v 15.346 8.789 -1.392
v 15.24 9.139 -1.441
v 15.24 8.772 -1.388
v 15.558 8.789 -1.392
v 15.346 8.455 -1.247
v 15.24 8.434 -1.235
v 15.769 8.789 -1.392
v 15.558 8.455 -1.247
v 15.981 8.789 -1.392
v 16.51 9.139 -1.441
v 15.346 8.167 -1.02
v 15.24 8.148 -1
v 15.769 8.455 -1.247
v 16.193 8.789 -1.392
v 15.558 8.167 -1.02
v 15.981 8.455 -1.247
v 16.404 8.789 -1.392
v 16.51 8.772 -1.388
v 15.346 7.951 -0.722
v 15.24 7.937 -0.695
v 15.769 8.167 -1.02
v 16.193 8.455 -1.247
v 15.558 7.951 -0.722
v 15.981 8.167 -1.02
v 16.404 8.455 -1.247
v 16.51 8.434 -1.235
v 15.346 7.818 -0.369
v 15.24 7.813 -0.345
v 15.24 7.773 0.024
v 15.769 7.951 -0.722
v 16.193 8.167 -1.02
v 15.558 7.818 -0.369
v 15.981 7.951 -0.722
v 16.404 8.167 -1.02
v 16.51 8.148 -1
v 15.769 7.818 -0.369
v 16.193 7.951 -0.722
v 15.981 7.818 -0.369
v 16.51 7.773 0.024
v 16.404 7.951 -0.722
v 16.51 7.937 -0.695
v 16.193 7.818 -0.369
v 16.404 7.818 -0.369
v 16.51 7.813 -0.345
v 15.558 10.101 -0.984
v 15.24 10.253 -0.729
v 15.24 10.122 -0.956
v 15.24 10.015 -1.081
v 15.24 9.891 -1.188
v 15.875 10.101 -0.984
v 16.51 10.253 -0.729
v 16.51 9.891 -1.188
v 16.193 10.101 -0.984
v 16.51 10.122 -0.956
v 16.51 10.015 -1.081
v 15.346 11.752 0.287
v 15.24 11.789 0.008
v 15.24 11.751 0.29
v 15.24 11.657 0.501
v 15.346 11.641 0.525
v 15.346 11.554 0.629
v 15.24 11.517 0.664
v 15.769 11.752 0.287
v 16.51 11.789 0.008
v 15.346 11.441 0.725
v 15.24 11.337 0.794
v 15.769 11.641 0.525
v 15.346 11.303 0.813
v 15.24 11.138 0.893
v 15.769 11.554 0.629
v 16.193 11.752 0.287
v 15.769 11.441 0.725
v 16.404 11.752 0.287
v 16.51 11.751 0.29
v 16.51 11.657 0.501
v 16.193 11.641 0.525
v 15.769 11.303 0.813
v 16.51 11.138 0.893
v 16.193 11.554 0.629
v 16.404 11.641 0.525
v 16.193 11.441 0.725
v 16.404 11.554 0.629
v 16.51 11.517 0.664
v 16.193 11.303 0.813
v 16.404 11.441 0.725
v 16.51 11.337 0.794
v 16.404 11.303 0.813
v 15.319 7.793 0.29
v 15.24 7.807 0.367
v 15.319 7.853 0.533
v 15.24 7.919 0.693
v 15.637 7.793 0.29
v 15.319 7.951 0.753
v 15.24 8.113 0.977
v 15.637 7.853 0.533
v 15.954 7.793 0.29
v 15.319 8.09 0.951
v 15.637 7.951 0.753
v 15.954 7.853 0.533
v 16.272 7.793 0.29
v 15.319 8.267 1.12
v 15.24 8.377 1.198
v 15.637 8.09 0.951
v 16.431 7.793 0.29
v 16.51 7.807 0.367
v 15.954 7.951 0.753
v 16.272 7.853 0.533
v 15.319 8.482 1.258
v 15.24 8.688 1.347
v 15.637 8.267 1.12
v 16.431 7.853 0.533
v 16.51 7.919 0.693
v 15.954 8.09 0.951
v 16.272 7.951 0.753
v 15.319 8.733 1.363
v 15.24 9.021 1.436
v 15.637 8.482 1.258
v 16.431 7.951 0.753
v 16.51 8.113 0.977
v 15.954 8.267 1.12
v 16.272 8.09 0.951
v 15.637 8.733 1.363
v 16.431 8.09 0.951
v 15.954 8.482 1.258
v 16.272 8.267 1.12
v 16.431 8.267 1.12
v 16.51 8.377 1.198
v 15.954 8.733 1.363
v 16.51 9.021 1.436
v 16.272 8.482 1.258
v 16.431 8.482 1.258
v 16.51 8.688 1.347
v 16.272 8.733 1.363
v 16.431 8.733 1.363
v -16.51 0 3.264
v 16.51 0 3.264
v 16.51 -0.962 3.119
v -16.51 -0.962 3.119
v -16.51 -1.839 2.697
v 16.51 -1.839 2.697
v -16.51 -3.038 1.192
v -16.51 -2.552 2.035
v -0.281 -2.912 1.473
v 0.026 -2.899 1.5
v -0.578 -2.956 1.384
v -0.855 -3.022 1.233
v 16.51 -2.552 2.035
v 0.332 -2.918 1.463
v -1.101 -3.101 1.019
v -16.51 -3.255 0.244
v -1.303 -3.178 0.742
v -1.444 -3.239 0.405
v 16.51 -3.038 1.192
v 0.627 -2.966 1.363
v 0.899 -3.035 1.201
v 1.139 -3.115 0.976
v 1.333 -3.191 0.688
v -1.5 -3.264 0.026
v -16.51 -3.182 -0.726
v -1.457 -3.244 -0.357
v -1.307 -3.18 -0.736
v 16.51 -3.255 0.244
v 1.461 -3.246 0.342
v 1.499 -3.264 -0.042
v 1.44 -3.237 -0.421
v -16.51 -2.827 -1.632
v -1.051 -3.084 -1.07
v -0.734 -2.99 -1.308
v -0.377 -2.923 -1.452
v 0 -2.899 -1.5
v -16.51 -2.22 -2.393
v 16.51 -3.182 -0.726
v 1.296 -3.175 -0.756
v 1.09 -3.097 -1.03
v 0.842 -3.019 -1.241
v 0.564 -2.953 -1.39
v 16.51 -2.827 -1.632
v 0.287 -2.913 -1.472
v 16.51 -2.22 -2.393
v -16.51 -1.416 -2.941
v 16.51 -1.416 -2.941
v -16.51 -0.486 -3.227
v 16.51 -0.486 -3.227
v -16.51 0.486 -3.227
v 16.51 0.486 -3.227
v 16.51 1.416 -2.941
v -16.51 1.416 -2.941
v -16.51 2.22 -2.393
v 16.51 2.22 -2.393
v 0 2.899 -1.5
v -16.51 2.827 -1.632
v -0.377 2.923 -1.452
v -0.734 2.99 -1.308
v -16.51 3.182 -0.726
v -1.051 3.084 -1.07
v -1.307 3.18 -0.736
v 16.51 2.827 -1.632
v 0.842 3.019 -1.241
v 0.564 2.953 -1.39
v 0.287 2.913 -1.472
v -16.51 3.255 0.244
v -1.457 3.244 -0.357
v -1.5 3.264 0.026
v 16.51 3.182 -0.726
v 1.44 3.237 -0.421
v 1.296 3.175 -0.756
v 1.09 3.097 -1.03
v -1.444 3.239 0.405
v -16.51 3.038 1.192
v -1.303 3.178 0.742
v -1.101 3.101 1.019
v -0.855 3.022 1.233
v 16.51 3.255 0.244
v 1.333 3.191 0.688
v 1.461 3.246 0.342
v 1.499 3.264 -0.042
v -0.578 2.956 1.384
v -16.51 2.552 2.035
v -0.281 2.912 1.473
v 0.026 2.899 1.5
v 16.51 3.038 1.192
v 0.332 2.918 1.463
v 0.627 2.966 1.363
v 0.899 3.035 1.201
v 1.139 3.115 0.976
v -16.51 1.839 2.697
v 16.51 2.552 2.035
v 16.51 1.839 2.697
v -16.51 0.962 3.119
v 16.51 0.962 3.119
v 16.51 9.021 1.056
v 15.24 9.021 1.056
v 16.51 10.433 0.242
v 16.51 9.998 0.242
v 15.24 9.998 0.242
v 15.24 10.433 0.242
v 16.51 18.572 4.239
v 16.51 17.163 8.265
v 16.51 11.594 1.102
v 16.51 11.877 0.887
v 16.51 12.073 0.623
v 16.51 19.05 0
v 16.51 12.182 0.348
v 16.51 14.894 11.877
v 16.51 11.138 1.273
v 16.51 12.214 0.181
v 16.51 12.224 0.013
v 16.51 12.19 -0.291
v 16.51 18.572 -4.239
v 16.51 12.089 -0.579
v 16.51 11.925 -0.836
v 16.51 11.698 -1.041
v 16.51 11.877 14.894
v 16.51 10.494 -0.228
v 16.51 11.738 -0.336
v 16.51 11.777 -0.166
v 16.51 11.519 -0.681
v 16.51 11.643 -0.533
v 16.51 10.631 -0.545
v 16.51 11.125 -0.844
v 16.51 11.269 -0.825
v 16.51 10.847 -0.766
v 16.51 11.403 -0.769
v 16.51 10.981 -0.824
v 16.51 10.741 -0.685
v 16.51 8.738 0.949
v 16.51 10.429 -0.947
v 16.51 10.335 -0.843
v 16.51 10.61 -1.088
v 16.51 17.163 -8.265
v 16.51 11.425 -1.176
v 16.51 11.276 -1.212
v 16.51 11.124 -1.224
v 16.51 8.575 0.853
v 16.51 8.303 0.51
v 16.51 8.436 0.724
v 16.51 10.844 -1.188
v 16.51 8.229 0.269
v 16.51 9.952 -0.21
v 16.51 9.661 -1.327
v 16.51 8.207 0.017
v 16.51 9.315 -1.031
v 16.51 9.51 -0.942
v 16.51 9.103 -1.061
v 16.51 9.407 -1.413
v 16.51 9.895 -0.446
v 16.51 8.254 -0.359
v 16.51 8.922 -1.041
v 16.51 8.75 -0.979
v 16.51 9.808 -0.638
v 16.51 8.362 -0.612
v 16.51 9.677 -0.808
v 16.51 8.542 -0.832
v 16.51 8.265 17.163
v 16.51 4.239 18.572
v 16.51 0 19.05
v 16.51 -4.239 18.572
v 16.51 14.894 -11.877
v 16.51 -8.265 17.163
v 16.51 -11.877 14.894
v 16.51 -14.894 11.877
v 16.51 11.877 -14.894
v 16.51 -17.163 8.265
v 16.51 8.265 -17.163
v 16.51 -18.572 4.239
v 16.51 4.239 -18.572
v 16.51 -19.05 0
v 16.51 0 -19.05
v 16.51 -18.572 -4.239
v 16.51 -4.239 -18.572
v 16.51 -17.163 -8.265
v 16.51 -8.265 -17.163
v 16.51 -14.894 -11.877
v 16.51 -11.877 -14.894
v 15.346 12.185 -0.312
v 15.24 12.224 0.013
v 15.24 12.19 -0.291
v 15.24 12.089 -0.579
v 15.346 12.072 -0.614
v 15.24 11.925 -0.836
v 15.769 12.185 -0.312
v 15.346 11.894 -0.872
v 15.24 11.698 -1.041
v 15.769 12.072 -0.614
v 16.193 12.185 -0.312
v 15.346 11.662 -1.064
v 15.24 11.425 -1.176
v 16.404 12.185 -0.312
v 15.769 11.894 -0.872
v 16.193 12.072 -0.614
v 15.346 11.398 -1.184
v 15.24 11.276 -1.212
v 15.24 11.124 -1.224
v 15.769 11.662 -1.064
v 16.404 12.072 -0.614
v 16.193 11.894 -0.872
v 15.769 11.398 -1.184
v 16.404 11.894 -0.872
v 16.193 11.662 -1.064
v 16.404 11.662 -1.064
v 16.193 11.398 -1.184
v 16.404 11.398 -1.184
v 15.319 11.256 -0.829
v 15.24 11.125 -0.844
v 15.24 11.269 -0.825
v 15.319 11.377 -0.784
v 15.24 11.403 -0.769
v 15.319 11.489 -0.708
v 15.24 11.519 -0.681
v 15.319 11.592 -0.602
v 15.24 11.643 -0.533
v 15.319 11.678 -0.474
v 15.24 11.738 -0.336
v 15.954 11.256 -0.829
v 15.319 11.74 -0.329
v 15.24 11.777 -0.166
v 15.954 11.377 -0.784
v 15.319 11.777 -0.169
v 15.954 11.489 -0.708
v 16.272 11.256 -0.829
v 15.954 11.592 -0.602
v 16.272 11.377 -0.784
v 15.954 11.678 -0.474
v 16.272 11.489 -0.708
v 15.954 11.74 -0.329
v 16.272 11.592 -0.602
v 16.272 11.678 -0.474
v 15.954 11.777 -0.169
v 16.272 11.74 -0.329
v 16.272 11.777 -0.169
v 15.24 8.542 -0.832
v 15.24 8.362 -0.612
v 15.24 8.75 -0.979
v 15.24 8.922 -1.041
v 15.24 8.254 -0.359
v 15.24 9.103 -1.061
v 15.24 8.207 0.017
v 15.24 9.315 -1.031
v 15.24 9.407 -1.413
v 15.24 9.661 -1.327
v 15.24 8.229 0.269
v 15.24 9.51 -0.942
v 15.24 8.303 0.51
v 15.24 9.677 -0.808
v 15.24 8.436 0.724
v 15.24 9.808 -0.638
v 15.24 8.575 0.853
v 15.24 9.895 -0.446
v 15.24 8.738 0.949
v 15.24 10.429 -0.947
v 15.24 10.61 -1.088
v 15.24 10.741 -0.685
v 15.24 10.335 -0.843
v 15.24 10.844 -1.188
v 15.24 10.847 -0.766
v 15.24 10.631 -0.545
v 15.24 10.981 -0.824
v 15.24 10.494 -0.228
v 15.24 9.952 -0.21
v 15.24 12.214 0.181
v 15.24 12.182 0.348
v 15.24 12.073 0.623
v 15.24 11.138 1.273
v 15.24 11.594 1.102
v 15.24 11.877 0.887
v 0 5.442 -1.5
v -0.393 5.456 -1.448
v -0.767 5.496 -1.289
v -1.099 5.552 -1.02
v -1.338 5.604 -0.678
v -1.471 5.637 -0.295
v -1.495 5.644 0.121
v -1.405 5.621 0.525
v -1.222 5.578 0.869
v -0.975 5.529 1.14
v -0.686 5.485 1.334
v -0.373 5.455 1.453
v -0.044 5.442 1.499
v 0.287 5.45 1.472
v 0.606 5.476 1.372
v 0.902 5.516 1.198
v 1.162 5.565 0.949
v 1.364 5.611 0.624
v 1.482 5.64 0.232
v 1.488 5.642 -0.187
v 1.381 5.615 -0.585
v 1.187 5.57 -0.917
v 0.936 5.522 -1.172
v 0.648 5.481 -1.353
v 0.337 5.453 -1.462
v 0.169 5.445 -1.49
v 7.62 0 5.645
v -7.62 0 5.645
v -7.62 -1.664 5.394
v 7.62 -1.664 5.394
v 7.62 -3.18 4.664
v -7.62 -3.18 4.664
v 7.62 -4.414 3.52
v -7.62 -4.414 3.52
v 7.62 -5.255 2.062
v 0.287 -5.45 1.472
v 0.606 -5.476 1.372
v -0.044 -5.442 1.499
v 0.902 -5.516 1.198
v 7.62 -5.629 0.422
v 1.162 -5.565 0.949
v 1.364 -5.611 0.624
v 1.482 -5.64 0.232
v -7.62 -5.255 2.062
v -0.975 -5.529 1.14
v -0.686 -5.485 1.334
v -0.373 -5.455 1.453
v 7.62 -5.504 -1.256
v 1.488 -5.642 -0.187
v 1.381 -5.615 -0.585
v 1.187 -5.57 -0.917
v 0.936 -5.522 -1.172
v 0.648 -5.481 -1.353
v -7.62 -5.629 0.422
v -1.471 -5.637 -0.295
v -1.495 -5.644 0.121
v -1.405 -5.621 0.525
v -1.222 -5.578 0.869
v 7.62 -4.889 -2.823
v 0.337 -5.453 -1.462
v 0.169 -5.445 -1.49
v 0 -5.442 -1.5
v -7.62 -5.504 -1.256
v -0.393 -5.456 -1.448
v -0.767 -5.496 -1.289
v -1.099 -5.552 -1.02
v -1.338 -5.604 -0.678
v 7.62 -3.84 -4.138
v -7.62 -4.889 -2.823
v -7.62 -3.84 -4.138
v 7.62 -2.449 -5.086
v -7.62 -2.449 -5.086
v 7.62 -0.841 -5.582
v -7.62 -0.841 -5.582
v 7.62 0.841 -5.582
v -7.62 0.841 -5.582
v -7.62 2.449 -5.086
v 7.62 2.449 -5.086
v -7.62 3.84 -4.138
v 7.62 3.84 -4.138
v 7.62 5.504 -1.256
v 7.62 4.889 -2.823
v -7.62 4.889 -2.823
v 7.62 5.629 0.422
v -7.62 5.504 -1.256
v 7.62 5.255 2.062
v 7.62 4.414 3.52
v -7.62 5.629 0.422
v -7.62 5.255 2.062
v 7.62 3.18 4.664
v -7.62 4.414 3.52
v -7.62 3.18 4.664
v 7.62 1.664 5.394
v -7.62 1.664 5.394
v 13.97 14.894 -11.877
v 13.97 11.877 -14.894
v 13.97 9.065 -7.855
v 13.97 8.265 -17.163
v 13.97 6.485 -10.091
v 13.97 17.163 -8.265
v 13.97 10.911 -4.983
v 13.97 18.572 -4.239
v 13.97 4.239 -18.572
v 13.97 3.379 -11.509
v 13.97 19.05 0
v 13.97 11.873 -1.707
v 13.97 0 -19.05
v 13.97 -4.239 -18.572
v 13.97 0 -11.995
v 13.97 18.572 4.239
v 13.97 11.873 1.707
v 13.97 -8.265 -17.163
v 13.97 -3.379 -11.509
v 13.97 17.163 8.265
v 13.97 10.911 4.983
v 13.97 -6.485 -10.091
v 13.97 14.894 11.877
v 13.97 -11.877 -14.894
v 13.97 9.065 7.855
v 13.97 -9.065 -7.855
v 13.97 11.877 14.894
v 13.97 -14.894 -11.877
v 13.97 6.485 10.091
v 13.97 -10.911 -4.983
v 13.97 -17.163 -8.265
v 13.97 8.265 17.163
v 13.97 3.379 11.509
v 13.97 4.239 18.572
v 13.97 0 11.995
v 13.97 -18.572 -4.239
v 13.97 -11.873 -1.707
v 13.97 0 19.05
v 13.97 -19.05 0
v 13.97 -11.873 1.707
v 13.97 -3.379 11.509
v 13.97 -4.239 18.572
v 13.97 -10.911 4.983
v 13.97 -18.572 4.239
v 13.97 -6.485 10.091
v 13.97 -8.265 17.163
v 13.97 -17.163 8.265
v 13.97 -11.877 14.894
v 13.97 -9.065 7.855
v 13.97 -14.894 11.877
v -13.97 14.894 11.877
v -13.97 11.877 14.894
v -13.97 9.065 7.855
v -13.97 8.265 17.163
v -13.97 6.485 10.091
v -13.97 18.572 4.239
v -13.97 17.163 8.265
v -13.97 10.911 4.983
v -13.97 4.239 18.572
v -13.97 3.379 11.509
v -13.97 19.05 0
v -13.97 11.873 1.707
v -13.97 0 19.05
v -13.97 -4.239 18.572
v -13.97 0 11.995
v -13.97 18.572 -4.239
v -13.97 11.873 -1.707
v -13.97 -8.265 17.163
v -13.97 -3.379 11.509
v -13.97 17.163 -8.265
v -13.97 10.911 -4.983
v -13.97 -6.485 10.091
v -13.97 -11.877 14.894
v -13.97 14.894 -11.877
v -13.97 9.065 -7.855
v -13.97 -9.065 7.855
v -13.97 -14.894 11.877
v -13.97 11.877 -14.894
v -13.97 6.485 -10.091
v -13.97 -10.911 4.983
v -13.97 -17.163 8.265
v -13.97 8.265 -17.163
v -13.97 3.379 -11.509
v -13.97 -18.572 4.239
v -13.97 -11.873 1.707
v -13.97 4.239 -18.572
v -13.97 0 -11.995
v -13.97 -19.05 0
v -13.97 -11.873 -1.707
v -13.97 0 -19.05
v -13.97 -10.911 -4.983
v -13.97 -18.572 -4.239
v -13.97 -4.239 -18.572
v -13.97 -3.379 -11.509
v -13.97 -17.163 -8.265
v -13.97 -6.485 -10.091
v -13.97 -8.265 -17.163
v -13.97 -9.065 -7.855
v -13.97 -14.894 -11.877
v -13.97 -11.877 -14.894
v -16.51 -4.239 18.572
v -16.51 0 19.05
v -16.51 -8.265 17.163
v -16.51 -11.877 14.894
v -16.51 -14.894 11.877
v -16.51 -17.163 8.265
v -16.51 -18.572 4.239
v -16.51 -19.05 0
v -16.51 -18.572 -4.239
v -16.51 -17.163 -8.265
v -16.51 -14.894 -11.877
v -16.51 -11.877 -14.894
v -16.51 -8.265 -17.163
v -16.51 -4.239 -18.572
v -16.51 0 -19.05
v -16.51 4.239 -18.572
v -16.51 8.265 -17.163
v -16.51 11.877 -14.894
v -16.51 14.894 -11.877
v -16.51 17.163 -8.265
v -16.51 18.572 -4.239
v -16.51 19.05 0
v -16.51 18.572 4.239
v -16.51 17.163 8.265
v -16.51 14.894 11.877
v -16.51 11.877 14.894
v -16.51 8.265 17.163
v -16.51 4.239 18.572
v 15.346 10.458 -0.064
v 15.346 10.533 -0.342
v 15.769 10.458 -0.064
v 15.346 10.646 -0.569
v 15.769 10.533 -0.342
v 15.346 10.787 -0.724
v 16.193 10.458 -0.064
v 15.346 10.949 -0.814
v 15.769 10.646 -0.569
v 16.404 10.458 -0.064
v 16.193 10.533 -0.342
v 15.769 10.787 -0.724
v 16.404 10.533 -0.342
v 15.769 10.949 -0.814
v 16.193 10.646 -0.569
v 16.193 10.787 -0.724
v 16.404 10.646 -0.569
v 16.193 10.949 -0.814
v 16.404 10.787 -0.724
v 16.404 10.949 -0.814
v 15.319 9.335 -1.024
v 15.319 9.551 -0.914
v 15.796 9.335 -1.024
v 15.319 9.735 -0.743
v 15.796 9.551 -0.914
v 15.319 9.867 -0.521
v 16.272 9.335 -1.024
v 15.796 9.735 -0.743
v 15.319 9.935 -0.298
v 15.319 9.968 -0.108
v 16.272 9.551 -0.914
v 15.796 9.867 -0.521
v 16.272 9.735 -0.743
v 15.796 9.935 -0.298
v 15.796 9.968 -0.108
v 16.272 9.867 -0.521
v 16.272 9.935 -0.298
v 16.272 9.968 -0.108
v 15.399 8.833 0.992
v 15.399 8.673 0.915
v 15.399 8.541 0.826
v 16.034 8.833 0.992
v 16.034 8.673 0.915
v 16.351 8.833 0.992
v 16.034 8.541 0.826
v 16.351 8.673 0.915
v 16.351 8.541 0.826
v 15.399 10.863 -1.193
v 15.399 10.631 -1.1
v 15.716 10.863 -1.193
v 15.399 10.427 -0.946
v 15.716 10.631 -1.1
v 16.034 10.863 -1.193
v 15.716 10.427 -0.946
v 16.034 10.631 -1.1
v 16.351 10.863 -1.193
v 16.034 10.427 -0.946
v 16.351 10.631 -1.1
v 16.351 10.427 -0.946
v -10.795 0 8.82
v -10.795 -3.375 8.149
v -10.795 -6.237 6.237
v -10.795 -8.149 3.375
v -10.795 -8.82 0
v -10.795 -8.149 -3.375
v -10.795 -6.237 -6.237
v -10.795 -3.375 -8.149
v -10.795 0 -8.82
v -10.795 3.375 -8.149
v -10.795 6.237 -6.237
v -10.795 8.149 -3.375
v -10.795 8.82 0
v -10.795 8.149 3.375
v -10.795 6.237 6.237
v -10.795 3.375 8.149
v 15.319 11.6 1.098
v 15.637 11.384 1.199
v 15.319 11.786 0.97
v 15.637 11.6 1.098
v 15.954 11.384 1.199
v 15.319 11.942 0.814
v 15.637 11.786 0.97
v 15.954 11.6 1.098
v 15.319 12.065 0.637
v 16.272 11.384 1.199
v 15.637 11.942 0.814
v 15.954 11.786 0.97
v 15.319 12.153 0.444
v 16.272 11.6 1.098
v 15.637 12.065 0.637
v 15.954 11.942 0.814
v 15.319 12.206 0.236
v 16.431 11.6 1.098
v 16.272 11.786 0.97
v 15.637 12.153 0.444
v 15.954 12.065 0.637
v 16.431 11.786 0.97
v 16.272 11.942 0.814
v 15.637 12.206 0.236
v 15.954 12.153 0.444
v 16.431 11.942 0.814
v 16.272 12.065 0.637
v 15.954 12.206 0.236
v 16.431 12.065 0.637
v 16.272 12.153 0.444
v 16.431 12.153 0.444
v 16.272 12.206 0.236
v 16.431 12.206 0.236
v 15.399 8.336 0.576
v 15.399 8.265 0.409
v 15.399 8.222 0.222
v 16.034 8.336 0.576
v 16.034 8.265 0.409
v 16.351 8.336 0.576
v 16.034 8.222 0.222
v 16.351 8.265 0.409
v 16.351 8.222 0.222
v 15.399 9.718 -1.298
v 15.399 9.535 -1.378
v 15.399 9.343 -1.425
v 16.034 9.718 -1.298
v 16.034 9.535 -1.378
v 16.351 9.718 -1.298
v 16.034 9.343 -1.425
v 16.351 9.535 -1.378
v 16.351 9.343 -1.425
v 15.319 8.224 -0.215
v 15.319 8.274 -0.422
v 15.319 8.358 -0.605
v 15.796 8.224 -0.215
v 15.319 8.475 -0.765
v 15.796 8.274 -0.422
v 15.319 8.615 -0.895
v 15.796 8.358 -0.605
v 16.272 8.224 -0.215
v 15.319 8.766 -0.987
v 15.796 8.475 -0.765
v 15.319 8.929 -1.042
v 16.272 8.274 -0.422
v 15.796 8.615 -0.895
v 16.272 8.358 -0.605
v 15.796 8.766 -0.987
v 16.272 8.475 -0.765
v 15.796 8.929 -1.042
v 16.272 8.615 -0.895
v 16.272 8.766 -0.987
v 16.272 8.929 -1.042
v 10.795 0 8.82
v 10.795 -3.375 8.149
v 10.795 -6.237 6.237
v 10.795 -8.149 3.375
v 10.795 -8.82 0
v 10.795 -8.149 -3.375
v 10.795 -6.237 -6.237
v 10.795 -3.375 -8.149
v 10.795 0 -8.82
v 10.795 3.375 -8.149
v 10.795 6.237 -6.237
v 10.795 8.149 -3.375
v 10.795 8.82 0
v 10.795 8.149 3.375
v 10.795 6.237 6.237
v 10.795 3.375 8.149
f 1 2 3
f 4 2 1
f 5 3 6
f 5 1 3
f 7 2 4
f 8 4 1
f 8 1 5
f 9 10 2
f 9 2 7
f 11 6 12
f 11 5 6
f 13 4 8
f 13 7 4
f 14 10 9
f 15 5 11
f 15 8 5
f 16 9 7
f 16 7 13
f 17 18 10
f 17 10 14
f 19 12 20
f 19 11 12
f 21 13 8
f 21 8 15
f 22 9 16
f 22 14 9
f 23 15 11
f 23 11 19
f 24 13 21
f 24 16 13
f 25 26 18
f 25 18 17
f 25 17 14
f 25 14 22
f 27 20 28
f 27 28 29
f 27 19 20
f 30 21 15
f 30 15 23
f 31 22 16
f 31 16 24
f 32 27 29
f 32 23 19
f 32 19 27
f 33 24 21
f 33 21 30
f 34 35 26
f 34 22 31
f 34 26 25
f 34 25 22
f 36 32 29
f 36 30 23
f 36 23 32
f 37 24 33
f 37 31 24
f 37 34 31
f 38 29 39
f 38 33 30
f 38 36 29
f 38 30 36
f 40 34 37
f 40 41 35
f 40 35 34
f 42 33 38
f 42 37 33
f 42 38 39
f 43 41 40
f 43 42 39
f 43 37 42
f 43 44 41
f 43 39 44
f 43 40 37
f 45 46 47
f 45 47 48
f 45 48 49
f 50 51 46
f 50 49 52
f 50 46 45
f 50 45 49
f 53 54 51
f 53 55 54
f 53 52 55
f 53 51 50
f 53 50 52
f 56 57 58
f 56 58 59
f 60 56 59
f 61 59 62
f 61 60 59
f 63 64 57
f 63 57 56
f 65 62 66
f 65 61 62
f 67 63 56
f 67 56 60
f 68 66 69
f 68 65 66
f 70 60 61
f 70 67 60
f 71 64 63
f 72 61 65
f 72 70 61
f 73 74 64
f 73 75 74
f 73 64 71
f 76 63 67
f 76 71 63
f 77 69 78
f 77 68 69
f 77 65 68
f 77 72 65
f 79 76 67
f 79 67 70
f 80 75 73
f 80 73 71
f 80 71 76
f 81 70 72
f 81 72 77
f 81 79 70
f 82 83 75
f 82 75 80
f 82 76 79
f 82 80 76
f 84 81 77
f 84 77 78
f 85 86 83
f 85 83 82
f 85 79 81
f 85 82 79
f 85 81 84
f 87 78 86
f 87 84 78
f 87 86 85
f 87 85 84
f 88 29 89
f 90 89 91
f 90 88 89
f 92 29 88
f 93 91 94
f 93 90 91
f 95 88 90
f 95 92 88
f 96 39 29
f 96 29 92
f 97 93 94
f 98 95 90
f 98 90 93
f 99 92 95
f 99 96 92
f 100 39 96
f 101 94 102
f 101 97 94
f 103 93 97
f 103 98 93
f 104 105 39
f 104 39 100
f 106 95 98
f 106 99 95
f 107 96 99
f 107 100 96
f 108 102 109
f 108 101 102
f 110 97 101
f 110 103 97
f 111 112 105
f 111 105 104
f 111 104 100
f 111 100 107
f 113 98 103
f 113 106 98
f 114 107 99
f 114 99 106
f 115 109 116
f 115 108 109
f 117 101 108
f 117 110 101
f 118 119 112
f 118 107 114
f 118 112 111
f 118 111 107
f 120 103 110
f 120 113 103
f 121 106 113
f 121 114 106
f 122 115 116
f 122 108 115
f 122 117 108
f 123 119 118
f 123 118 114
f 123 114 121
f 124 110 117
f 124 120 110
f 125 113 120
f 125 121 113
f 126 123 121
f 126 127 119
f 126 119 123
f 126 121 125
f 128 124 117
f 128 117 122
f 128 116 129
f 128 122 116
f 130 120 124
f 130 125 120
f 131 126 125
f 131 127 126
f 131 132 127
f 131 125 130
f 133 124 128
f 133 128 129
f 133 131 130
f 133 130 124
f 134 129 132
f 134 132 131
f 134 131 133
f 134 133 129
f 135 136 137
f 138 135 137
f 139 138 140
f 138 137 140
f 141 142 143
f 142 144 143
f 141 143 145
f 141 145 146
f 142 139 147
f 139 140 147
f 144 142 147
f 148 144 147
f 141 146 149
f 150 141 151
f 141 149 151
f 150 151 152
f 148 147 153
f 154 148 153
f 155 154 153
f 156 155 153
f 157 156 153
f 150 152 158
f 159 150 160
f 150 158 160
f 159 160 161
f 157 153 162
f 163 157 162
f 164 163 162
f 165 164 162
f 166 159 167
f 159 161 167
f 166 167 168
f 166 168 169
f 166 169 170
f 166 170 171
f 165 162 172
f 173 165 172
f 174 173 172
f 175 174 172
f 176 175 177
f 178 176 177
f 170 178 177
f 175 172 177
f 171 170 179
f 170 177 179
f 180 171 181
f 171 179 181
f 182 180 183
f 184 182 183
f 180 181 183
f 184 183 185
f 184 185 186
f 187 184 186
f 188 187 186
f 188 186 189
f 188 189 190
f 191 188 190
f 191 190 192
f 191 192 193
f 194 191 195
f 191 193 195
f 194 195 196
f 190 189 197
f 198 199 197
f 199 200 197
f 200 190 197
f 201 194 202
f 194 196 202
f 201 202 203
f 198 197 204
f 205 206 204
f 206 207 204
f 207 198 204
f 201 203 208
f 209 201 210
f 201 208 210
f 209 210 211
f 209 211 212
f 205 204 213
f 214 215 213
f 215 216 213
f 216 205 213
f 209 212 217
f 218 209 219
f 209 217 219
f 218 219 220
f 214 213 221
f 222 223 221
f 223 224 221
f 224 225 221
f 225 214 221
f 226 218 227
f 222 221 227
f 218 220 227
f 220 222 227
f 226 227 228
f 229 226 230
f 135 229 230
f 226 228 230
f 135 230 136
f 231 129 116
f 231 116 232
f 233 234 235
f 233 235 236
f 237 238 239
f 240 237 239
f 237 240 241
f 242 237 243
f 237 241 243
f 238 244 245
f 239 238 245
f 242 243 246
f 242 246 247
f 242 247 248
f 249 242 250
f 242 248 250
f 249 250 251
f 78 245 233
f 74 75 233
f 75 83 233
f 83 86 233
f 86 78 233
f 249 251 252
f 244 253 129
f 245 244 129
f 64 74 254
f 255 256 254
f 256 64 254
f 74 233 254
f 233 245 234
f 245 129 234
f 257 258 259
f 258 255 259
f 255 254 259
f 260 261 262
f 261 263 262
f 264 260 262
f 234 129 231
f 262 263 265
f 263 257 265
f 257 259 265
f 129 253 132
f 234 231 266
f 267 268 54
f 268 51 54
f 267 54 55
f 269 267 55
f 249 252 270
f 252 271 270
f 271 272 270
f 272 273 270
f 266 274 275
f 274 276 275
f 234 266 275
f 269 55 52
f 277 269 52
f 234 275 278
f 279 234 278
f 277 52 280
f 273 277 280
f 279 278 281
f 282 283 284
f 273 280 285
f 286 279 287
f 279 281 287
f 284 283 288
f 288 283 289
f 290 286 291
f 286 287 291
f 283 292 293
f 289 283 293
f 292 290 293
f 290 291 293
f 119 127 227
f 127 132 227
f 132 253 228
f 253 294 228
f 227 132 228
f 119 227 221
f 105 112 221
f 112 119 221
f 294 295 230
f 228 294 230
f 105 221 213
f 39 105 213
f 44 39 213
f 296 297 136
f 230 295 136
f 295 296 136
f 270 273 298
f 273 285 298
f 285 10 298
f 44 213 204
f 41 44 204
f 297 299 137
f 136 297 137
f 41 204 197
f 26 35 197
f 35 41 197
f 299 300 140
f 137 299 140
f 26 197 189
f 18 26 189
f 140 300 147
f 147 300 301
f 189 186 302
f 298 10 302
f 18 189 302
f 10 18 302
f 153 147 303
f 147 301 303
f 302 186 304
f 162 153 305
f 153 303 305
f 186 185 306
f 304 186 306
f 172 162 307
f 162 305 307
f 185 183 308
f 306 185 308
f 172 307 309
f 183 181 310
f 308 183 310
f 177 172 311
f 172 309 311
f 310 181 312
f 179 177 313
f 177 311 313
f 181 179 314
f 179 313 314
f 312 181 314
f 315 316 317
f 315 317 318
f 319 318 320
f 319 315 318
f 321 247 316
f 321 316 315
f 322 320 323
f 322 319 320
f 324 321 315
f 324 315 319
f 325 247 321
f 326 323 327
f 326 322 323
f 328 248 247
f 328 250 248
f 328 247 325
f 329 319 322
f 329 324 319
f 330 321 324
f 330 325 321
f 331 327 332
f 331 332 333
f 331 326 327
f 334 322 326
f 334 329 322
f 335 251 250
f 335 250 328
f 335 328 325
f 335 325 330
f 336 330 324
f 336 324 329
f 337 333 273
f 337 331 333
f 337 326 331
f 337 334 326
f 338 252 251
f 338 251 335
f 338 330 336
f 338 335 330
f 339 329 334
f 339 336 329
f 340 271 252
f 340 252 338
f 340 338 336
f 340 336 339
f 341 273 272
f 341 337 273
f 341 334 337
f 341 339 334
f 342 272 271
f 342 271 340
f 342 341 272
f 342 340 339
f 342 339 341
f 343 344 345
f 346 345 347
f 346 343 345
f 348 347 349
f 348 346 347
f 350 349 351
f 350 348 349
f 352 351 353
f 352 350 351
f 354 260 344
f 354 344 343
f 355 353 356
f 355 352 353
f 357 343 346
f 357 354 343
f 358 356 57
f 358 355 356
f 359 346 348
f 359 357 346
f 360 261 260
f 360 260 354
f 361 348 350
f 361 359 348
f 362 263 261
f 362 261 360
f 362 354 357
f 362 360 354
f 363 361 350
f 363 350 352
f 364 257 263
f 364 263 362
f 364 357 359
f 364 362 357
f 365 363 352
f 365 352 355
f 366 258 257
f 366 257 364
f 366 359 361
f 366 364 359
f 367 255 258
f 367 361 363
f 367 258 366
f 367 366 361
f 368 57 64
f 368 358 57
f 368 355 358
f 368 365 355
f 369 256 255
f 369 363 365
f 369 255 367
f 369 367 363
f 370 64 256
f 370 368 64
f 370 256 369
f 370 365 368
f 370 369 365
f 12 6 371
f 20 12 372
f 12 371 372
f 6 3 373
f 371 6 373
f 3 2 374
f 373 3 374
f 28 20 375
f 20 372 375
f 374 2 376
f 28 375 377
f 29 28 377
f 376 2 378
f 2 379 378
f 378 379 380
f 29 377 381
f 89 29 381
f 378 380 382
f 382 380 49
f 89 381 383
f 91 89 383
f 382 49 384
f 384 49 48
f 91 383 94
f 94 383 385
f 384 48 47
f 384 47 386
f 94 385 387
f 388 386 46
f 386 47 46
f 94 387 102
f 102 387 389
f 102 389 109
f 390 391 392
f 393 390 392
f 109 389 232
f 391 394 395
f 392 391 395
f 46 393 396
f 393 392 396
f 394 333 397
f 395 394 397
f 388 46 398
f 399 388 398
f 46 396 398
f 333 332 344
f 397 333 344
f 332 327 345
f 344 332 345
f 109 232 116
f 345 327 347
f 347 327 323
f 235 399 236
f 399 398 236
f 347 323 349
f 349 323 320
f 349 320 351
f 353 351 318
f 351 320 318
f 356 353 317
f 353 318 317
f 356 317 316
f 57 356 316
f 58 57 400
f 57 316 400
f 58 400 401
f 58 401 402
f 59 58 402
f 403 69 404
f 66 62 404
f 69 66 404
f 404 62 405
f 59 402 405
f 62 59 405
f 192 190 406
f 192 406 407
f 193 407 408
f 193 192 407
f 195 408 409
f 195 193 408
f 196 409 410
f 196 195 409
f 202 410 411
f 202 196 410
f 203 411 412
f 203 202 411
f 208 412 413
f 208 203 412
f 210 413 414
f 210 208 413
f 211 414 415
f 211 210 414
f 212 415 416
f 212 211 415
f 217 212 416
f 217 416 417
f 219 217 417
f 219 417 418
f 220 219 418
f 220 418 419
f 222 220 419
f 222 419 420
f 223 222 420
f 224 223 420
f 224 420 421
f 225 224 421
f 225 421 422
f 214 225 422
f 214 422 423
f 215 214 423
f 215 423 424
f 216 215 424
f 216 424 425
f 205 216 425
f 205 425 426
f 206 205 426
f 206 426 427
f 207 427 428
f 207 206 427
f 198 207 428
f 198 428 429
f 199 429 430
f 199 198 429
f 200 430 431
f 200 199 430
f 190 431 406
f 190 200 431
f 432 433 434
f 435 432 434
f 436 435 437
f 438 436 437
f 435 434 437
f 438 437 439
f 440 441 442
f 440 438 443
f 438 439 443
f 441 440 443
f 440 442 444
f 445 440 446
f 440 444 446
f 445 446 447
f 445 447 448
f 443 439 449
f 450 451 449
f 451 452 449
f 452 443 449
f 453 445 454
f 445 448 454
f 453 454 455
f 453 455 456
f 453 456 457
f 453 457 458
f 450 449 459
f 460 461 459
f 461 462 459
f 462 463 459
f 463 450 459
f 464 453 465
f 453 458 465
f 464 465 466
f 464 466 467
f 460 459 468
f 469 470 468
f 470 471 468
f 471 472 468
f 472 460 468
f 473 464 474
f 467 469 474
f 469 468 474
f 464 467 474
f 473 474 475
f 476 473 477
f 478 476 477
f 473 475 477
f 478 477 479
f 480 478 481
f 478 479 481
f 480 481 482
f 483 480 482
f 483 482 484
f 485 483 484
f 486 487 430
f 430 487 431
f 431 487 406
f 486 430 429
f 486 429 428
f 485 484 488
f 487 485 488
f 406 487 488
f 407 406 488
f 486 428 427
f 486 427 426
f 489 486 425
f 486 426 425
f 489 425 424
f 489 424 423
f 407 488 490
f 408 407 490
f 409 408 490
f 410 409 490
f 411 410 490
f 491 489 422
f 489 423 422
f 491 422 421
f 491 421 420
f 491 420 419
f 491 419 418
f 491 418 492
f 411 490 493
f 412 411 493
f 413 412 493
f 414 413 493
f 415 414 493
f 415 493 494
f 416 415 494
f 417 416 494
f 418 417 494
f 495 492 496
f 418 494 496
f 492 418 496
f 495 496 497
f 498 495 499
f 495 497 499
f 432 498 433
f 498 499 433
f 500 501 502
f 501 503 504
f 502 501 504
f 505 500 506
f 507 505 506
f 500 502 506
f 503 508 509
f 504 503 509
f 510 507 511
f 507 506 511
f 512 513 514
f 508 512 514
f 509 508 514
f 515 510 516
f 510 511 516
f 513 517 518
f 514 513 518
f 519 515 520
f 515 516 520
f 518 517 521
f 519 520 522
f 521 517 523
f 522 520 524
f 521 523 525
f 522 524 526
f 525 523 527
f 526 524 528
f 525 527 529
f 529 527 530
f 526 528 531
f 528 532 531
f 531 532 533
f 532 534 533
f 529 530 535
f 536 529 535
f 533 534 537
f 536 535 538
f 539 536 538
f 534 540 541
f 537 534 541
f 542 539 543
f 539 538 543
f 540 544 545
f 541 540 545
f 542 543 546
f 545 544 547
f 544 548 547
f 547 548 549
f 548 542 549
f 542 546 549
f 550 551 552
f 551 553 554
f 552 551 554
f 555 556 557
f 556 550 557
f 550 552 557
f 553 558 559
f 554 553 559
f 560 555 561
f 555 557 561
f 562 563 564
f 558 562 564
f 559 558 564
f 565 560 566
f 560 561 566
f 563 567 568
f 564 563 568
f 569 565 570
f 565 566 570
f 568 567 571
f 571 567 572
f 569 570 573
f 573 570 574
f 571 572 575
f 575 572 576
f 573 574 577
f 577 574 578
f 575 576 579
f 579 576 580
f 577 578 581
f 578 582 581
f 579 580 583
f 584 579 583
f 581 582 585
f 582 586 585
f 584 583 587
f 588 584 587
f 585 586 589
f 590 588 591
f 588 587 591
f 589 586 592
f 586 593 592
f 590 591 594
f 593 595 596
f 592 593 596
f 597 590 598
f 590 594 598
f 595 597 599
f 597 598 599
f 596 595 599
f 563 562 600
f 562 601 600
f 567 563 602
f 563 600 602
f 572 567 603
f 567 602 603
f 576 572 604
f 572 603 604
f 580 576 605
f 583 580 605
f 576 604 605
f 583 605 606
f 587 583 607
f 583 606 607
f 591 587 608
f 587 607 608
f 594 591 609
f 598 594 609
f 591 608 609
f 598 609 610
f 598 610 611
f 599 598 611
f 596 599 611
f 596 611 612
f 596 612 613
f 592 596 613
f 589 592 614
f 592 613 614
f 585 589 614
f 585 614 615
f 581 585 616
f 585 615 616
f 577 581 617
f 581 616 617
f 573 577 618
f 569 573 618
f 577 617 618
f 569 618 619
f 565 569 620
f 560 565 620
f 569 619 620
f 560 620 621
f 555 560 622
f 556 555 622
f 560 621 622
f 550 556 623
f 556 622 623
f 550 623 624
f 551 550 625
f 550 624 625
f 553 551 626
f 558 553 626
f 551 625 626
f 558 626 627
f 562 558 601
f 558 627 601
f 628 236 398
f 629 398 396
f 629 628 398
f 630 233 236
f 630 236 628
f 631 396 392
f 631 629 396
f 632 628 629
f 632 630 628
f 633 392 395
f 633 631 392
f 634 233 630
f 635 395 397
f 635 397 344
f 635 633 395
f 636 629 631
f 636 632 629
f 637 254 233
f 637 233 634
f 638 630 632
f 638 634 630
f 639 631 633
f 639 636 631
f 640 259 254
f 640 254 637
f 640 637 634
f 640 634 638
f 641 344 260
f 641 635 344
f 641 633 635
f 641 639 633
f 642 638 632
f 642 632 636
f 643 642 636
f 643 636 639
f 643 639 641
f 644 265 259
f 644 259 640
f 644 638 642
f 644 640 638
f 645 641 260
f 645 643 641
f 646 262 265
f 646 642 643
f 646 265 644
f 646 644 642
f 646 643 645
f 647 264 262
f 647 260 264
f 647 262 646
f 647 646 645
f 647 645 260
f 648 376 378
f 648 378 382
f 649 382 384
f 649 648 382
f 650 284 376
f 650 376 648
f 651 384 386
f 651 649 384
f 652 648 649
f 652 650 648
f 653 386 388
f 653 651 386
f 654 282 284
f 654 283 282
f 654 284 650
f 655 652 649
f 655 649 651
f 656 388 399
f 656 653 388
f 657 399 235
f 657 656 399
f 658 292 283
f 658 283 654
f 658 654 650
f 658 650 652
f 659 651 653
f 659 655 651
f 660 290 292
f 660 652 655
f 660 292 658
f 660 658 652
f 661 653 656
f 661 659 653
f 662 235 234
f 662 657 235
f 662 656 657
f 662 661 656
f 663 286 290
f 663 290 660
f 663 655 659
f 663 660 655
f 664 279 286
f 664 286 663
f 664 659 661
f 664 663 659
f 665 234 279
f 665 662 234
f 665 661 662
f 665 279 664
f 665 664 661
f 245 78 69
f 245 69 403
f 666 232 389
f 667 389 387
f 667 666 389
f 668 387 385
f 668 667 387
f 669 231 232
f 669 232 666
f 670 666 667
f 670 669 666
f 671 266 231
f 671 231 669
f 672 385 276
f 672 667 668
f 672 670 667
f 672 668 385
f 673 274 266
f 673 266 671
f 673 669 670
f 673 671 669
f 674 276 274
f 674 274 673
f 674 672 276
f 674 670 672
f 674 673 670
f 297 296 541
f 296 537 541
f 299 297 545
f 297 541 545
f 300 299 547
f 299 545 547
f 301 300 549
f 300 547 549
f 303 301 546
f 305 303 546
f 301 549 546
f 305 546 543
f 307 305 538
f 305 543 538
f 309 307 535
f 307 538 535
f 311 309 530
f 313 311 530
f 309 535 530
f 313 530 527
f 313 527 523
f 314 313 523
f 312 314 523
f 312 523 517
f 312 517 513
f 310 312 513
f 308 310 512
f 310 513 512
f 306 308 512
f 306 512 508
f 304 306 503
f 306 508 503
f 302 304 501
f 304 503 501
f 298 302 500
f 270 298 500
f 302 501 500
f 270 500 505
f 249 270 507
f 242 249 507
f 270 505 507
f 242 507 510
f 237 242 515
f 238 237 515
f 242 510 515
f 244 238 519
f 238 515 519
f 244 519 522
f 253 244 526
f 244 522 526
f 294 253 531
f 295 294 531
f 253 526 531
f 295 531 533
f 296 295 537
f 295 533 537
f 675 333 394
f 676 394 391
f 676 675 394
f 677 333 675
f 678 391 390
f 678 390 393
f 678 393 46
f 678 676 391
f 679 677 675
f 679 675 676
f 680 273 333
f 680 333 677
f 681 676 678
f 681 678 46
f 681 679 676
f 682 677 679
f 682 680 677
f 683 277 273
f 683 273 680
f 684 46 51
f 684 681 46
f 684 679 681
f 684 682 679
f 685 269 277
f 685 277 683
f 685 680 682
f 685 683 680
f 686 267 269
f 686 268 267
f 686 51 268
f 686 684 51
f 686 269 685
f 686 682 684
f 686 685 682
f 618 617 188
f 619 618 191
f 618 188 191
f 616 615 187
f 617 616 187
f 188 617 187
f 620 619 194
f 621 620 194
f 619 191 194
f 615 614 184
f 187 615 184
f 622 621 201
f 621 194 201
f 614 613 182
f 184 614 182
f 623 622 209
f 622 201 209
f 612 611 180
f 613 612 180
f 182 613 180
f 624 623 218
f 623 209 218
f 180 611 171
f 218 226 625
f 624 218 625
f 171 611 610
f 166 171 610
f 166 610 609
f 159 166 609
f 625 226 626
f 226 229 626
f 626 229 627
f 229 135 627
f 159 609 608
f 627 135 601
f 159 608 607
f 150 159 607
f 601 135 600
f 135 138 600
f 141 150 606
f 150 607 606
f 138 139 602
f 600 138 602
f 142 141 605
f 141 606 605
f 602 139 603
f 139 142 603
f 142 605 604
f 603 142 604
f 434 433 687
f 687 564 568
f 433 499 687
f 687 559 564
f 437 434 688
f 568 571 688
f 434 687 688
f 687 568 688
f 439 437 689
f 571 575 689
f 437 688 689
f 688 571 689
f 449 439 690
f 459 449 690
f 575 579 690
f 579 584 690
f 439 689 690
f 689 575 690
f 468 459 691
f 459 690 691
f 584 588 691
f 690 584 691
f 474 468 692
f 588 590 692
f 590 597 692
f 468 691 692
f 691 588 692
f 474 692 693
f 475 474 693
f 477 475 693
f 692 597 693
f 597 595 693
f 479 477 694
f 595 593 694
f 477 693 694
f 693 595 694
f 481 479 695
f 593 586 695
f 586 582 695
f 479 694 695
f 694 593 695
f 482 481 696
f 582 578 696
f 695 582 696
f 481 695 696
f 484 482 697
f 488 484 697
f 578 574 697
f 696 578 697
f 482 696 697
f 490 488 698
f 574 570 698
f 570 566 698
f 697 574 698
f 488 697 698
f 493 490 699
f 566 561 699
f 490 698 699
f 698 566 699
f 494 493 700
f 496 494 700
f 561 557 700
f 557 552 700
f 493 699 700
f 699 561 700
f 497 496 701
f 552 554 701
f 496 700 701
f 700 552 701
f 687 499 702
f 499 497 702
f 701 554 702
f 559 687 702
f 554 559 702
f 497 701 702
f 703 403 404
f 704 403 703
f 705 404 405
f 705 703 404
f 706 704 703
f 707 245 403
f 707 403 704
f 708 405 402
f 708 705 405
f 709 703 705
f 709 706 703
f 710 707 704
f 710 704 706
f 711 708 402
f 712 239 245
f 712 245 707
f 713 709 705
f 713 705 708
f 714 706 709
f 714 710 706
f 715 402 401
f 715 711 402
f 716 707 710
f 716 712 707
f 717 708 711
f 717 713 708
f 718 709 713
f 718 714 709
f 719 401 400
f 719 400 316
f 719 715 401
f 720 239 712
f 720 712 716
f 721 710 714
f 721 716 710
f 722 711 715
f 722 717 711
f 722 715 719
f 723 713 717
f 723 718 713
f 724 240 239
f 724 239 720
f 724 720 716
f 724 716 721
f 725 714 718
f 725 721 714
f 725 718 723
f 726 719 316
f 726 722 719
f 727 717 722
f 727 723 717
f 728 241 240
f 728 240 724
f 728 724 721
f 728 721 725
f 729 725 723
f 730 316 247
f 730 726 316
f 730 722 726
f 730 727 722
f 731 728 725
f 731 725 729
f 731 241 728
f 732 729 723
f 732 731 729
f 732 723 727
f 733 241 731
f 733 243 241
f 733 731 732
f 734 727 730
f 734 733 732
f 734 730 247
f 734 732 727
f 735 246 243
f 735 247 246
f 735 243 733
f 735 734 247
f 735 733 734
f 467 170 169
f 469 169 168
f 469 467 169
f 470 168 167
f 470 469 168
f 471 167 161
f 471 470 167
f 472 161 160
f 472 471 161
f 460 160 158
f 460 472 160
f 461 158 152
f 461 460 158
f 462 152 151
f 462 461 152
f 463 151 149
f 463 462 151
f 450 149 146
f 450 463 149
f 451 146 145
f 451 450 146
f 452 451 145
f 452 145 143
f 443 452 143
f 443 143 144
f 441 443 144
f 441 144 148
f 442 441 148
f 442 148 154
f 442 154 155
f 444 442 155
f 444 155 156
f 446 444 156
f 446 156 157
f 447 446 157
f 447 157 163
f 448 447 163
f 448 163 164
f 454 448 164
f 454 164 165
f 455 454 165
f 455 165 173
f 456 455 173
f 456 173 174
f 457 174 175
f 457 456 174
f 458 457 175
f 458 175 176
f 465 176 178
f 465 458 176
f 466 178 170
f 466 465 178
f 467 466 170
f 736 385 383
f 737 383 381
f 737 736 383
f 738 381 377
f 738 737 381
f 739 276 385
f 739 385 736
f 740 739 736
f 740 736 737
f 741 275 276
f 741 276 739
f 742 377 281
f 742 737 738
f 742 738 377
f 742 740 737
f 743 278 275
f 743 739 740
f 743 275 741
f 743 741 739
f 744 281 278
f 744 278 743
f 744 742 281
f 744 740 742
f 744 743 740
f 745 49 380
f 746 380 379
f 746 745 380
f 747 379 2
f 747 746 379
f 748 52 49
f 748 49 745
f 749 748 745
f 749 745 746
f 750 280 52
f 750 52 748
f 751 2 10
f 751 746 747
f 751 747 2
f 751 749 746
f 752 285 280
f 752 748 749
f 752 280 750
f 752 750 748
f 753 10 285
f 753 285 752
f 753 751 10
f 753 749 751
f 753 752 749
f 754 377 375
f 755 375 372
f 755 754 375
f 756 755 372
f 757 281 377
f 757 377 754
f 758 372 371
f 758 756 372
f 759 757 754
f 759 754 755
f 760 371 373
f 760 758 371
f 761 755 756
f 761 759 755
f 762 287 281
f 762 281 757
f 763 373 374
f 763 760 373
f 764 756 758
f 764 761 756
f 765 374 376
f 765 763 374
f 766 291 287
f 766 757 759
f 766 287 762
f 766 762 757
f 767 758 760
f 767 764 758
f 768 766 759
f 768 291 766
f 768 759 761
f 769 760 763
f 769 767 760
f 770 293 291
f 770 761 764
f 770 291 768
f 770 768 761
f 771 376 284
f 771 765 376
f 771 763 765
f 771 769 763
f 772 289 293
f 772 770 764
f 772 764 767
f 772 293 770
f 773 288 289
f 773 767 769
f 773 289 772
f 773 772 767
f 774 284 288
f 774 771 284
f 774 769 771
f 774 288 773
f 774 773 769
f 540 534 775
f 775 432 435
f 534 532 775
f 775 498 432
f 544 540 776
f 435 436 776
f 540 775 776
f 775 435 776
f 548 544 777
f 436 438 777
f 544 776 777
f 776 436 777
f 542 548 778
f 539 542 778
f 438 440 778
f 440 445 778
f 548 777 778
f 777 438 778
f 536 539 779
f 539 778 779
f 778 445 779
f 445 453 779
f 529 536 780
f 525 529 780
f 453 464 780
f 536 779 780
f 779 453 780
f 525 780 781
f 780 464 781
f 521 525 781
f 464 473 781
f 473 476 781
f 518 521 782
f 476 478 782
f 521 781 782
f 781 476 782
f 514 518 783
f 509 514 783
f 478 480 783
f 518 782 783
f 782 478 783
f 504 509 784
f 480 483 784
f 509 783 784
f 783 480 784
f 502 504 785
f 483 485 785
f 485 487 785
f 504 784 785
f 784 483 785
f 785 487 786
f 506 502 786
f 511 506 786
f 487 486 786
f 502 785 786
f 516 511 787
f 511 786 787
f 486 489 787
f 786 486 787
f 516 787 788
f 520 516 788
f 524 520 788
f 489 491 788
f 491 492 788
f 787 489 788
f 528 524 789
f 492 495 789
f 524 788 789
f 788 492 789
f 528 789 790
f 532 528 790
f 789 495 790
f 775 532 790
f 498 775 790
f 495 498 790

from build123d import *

# Parameters (mm, degrees)
CUT_EXTRUDE1_DEPTH      = 32.597232474
CUT_EXTRUDE1_DEPTH_BACK = 32.597232474
SKETCH2_R               = 1.5
CUT_EXTRUDE2_DEPTH      = 1.27
CHAMFER1_SIZE           = 6.35


with BuildPart() as part:
    # Sketch1 → Revolve1 (revolve)
    with BuildSketch(Plane.XY):
        Polygon((16.51, 3.2639), (16.51, 19.05), (13.97, 19.05), (13.97, 5.64515), (-13.97, 5.64515), (-13.97, 19.05), (-16.51, 19.05), (-16.51, 3.2639), align=None)
    revolve(axis=Axis((-15.275524476, 0, 0), (1, 0, 0)))

    # Sketch2 → Cut-Extrude1 (cut, two sides: drawn at the far end of the back side and taken through both)
    with BuildSketch(Plane(origin=(0, 0, 0), x_dir=(1, 0, 0), z_dir=(0, 1, 0)).offset(-CUT_EXTRUDE1_DEPTH_BACK)):
        Circle(SKETCH2_R)
    extrude(amount=CUT_EXTRUDE1_DEPTH + CUT_EXTRUDE1_DEPTH_BACK, mode=Mode.SUBTRACT)

    # Sketch3 → Cut-Extrude2 (cut)
    with BuildSketch(Plane(origin=(16.51, 0, 0), x_dir=(0, 0, -1), z_dir=(1, 0, 0))):
        with BuildLine():
            Line((-0.892975977, 11.138058786), (-1.272890507, 11.138058786))
            add(Edge.make_bspline(
                [(-1.272890507, 11.138058786), (-1.262598003, 11.180673314), (-1.242476999, 11.263981231), (-1.200509458, 11.383007156), (-1.154790359, 11.495642272), (-1.099891156, 11.599777524), (-1.040009139, 11.69750572), (-0.971401657, 11.78661028), (-0.897233992, 11.869357391), (-0.815198101, 11.942791497), (-0.729166292, 12.00928837), (-0.637926323, 12.065984868), (-0.543313871, 12.114757891), (-0.444673415, 12.154938552), (-0.341711283, 12.185207519), (-0.23535831, 12.207168607), (-0.125335791, 12.221430241), (-0.05065061, 12.222822116), (-0.01272758, 12.223528871)],
                knots=[0, 0, 0, 0, 1.162005537, 2.271625781, 3.343758855, 4.383309926, 5.390229558, 6.379919256, 7.361854164, 8.333198761, 9.295911338, 10.242430842, 11.177959212, 12.116337295, 13.062827104, 14.020064771, 14.994644689, 16, 16, 16, 16], degree=3))
            add(Edge.make_bspline(
                [(-0.01272758, 12.223528871), (0.042526785, 12.221860659), (0.151830255, 12.218560624), (0.312410321, 12.18842602), (0.467261807, 12.140740384), (0.614689755, 12.074853114), (0.751630144, 11.993588459), (0.873472961, 11.896869206), (0.978566683, 11.786561479), (1.066734169, 11.664723044), (1.135767739, 11.534511142), (1.18667221, 11.400495714), (1.217662243, 11.262994663), (1.221678536, 11.170154906), (1.22369069, 11.123642386)],
                knots=[0, 0, 0, 0, 1.083050992, 2.142477498, 3.193116406, 4.255571735, 5.30263384, 6.308962982, 7.297363603, 8.282367274, 9.249857812, 10.179914175, 11.08814088, 12, 12, 12, 12], degree=3))
            add(Edge.make_bspline(
                [(1.22369069, 11.123642386), (1.222283298, 11.078881787), (1.219529252, 10.99129224), (1.196144675, 10.863419572), (1.156791291, 10.742900684), (1.10227834, 10.629228231), (1.031712846, 10.523122948), (0.946232536, 10.424346109), (0.845234078, 10.332459603), (0.768696696, 10.279821765), (0.729292987, 10.252722247)],
                knots=[0, 0, 0, 0, 1.024540389, 2.004866551, 2.965041327, 3.920577974, 4.882998113, 5.874504559, 6.905732034, 8, 8, 8, 8], degree=3))
            add(Edge.make_bspline(
                [(0.729292987, 10.252722247), (0.77432568, 10.230977221), (0.863548471, 10.187894034), (0.98516673, 10.103401832), (1.095569494, 10.005846059), (1.157138754, 9.929715422), (1.188073702, 9.891464234)],
                knots=[0, 0, 0, 0, 1.015518401, 2.012035669, 3.001164323, 4, 4, 4, 4], degree=3))
            add(Edge.make_bspline(
                [(1.188073702, 9.891464234), (1.208443707, 9.863575335), (1.248850143, 9.808254236), (1.298725503, 9.719310178), (1.343972717, 9.629380281), (1.379230602, 9.536054143), (1.406534231, 9.44041345), (1.426051146, 9.34229398), (1.438175583, 9.24161561), (1.439911918, 9.173504325), (1.440784707, 9.139267386)],
                knots=[0, 0, 0, 0, 1.025084078, 2.033381695, 3.024893161, 4.013698104, 4.991890475, 5.976764909, 6.982997093, 8, 8, 8, 8], degree=3))
            add(Edge.make_bspline(
                [(1.440784707, 9.139267386), (1.4386142, 9.079988962), (1.434283401, 8.961711077), (1.395573711, 8.786965462), (1.335565315, 8.616149854), (1.250345973, 8.45277362), (1.146487177, 8.29991354), (1.022925461, 8.163145052), (0.881064757, 8.045581026), (0.722852211, 7.947355321), (0.55144197, 7.868835549), (0.368107682, 7.814337499), (0.17549095, 7.778842814), (0.043402124, 7.775036601), (-0.023751885, 7.773101521)],
                knots=[0, 0, 0, 0, 0.955779014, 1.907060117, 2.875433937, 3.871313158, 4.872415639, 5.851225146, 6.836215519, 7.83643374, 8.849228613, 9.86973379, 10.916971861, 12, 12, 12, 12], degree=3))
            add(Edge.make_bspline(
                [(-0.023751885, 7.773101521), (-0.06901142, 7.774151645), (-0.158067092, 7.77621794), (-0.28899018, 7.790343487), (-0.413960236, 7.816142636), (-0.533146225, 7.850859967), (-0.646654031, 7.894876646), (-0.754137282, 7.94969069), (-0.856257249, 8.014172221), (-0.952050266, 8.08908237), (-1.041504915, 8.1728798), (-1.122243924, 8.267052126), (-1.195613388, 8.36985851), (-1.25964877, 8.482493064), (-1.317266798, 8.603500185), (-1.364657098, 8.734429321), (-1.406368214, 8.874109995), (-1.425761071, 8.971449738), (-1.43571102, 9.021392119)],
                knots=[0, 0, 0, 0, 1.048658725, 2.063410685, 3.046034179, 4.001477787, 4.936774919, 5.862367409, 6.792675028, 7.730719943, 8.675894397, 9.627829632, 10.600096036, 11.597688215, 12.626045268, 13.701542398, 14.82072376, 16, 16, 16, 16], degree=3))
            Line((-1.43571102, 9.021392119), (-1.05579649, 9.021392119))
            add(Edge.make_bspline(
                [(-1.05579649, 9.021392119), (-1.045898604, 8.988796646), (-1.026646356, 8.925395619), (-0.993875158, 8.834148773), (-0.956539248, 8.750500461), (-0.916486401, 8.673837066), (-0.874421042, 8.603403589), (-0.827352514, 8.541062471), (-0.778766976, 8.484075512), (-0.742143377, 8.451969172), (-0.7242193, 8.436255901)],
                knots=[0, 0, 0, 0, 1.198163088, 2.33053128, 3.407730985, 4.417276592, 5.372219308, 6.28897303, 7.162600585, 8, 8, 8, 8], degree=3))
            add(Edge.make_bspline(
                [(-0.7242193, 8.436255901), (-0.700516774, 8.417982012), (-0.653184886, 8.38149064), (-0.576055693, 8.334922003), (-0.494939116, 8.294571049), (-0.408077558, 8.263747912), (-0.317345407, 8.237649218), (-0.221276117, 8.220570114), (-0.120717255, 8.20885204), (-0.052055293, 8.20781798), (-0.016967697, 8.207289555)],
                knots=[0, 0, 0, 0, 0.946170439, 1.889420265, 2.845303464, 3.807233317, 4.801018734, 5.828864929, 6.890507805, 8, 8, 8, 8], degree=3))
            add(Edge.make_bspline(
                [(-0.016967697, 8.207289555), (0.022648444, 8.208034507), (0.100114388, 8.209491196), (0.213150266, 8.222887528), (0.320685941, 8.242397647), (0.421527479, 8.272530493), (0.516995807, 8.309760665), (0.60575266, 8.356506832), (0.688963188, 8.411352352), (0.765561612, 8.473690192), (0.834438559, 8.541933334), (0.895083494, 8.613311048), (0.946639037, 8.687522385), (0.988226794, 8.764978017), (1.021066031, 8.845357198), (1.043421902, 8.928885497), (1.058966115, 9.014879333), (1.060232018, 9.073334372), (1.060870177, 9.102802376)],
                knots=[0, 0, 0, 0, 1.217147791, 2.380027433, 3.494444702, 4.572153297, 5.609568379, 6.639424714, 7.649109417, 8.668170816, 9.669597737, 10.625200337, 11.543417969, 12.441394052, 13.322311151, 14.205496177, 15.095365482, 16, 16, 16, 16], degree=3))
            add(Edge.make_bspline(
                [(1.060870177, 9.102802376), (1.059019241, 9.142246566), (1.055326578, 9.220938679), (1.027134296, 9.336711364), (0.980762527, 9.448257777), (0.915844347, 9.553674781), (0.836819228, 9.651375157), (0.744454055, 9.738547331), (0.637981816, 9.810477822), (0.539986356, 9.86017553), (0.45318469, 9.89408704), (0.378901321, 9.916674854), (0.295738572, 9.935801847), (0.204702131, 9.95359669), (0.10510605, 9.968741559), (-0.002941242, 9.981371183), (-0.119461639, 9.991476804), (-0.200126192, 9.995989653), (-0.241693926, 9.998315196)],
                knots=[0, 0, 0, 0, 1.07054697, 2.135767047, 3.216561865, 4.33974944, 5.486079747, 6.621378074, 7.775625952, 8.963672916, 9.598146892, 10.304877434, 11.070270905, 11.915000392, 12.823868403, 13.805723172, 14.86925407, 16, 16, 16, 16], degree=3))
            Line((-0.241693926, 9.998315196), (-0.241693926, 10.43250323))
            add(Edge.make_bspline(
                [(-0.241693926, 10.43250323), (-0.189320135, 10.433391993), (-0.086732744, 10.43513286), (0.063120367, 10.456188263), (0.206416659, 10.485314356), (0.339980433, 10.529927875), (0.461717448, 10.581744234), (0.567332586, 10.642041668), (0.655346183, 10.709067127), (0.725330526, 10.78385514), (0.777980165, 10.864064769), (0.816475434, 10.947663012), (0.839214876, 11.03538259), (0.842250378, 11.09524757), (0.84377616, 11.125338433)],
                knots=[0, 0, 0, 0, 1.321986639, 2.589447074, 3.816329219, 5.01088745, 6.139805852, 7.153945165, 8.075214402, 8.924034688, 9.728124013, 10.488707548, 11.240355623, 12, 12, 12, 12], degree=3))
            add(Edge.make_bspline(
                [(0.84377616, 11.125338433), (0.84327492, 11.147445801), (0.842277727, 11.191427361), (0.829701972, 11.255683397), (0.810804322, 11.317975017), (0.784824078, 11.378037321), (0.750050028, 11.435453747), (0.708435168, 11.490713805), (0.658883276, 11.543501994), (0.60210164, 11.592705809), (0.541127361, 11.639598125), (0.474301443, 11.679407952), (0.403638794, 11.713450075), (0.329061183, 11.741522521), (0.250326589, 11.762639945), (0.167804944, 11.777802344), (0.081338888, 11.787282174), (0.022348317, 11.78864702), (-0.007639439, 11.789340837)],
                knots=[0, 0, 0, 0, 0.884392785, 1.759457502, 2.611959086, 3.489218968, 4.37281399, 5.2945488, 6.255912374, 7.266815255, 8.301784654, 9.332968512, 10.37626691, 11.440494194, 12.520033166, 13.637162961, 14.798855837, 16, 16, 16, 16], degree=3))
            add(Edge.make_bspline(
                [(-0.007639439, 11.789340837), (-0.05584098, 11.787657952), (-0.149989801, 11.784370885), (-0.285716415, 11.755580573), (-0.411893133, 11.709645177), (-0.508338949, 11.654813811), (-0.579558824, 11.600687096), (-0.630451883, 11.553416019), (-0.680430024, 11.500882984), (-0.726205271, 11.439852378), (-0.772498557, 11.374457308), (-0.814643884, 11.301373427), (-0.855597988, 11.222507159), (-0.880275358, 11.166753392), (-0.892975977, 11.138058786)],
                knots=[0, 0, 0, 0, 1.472543308, 2.876219568, 4.221790263, 5.565193594, 6.249813518, 6.953379497, 7.687249741, 8.463570142, 9.283606569, 10.136032583, 11.040678096, 12, 12, 12, 12], degree=3))
        make_face()
    extrude(amount=-CUT_EXTRUDE2_DEPTH, mode=Mode.SUBTRACT)

    # Chamfer1
    chamfer1_edges = [part.edges().sort_by_distance(p)[0] for p in [
        (13.97, -5.64515, 0),
        (-13.97, -5.64515, 0),
    ]]
    chamfer(chamfer1_edges, length=CHAMFER1_SIZE)


solid = part.part
